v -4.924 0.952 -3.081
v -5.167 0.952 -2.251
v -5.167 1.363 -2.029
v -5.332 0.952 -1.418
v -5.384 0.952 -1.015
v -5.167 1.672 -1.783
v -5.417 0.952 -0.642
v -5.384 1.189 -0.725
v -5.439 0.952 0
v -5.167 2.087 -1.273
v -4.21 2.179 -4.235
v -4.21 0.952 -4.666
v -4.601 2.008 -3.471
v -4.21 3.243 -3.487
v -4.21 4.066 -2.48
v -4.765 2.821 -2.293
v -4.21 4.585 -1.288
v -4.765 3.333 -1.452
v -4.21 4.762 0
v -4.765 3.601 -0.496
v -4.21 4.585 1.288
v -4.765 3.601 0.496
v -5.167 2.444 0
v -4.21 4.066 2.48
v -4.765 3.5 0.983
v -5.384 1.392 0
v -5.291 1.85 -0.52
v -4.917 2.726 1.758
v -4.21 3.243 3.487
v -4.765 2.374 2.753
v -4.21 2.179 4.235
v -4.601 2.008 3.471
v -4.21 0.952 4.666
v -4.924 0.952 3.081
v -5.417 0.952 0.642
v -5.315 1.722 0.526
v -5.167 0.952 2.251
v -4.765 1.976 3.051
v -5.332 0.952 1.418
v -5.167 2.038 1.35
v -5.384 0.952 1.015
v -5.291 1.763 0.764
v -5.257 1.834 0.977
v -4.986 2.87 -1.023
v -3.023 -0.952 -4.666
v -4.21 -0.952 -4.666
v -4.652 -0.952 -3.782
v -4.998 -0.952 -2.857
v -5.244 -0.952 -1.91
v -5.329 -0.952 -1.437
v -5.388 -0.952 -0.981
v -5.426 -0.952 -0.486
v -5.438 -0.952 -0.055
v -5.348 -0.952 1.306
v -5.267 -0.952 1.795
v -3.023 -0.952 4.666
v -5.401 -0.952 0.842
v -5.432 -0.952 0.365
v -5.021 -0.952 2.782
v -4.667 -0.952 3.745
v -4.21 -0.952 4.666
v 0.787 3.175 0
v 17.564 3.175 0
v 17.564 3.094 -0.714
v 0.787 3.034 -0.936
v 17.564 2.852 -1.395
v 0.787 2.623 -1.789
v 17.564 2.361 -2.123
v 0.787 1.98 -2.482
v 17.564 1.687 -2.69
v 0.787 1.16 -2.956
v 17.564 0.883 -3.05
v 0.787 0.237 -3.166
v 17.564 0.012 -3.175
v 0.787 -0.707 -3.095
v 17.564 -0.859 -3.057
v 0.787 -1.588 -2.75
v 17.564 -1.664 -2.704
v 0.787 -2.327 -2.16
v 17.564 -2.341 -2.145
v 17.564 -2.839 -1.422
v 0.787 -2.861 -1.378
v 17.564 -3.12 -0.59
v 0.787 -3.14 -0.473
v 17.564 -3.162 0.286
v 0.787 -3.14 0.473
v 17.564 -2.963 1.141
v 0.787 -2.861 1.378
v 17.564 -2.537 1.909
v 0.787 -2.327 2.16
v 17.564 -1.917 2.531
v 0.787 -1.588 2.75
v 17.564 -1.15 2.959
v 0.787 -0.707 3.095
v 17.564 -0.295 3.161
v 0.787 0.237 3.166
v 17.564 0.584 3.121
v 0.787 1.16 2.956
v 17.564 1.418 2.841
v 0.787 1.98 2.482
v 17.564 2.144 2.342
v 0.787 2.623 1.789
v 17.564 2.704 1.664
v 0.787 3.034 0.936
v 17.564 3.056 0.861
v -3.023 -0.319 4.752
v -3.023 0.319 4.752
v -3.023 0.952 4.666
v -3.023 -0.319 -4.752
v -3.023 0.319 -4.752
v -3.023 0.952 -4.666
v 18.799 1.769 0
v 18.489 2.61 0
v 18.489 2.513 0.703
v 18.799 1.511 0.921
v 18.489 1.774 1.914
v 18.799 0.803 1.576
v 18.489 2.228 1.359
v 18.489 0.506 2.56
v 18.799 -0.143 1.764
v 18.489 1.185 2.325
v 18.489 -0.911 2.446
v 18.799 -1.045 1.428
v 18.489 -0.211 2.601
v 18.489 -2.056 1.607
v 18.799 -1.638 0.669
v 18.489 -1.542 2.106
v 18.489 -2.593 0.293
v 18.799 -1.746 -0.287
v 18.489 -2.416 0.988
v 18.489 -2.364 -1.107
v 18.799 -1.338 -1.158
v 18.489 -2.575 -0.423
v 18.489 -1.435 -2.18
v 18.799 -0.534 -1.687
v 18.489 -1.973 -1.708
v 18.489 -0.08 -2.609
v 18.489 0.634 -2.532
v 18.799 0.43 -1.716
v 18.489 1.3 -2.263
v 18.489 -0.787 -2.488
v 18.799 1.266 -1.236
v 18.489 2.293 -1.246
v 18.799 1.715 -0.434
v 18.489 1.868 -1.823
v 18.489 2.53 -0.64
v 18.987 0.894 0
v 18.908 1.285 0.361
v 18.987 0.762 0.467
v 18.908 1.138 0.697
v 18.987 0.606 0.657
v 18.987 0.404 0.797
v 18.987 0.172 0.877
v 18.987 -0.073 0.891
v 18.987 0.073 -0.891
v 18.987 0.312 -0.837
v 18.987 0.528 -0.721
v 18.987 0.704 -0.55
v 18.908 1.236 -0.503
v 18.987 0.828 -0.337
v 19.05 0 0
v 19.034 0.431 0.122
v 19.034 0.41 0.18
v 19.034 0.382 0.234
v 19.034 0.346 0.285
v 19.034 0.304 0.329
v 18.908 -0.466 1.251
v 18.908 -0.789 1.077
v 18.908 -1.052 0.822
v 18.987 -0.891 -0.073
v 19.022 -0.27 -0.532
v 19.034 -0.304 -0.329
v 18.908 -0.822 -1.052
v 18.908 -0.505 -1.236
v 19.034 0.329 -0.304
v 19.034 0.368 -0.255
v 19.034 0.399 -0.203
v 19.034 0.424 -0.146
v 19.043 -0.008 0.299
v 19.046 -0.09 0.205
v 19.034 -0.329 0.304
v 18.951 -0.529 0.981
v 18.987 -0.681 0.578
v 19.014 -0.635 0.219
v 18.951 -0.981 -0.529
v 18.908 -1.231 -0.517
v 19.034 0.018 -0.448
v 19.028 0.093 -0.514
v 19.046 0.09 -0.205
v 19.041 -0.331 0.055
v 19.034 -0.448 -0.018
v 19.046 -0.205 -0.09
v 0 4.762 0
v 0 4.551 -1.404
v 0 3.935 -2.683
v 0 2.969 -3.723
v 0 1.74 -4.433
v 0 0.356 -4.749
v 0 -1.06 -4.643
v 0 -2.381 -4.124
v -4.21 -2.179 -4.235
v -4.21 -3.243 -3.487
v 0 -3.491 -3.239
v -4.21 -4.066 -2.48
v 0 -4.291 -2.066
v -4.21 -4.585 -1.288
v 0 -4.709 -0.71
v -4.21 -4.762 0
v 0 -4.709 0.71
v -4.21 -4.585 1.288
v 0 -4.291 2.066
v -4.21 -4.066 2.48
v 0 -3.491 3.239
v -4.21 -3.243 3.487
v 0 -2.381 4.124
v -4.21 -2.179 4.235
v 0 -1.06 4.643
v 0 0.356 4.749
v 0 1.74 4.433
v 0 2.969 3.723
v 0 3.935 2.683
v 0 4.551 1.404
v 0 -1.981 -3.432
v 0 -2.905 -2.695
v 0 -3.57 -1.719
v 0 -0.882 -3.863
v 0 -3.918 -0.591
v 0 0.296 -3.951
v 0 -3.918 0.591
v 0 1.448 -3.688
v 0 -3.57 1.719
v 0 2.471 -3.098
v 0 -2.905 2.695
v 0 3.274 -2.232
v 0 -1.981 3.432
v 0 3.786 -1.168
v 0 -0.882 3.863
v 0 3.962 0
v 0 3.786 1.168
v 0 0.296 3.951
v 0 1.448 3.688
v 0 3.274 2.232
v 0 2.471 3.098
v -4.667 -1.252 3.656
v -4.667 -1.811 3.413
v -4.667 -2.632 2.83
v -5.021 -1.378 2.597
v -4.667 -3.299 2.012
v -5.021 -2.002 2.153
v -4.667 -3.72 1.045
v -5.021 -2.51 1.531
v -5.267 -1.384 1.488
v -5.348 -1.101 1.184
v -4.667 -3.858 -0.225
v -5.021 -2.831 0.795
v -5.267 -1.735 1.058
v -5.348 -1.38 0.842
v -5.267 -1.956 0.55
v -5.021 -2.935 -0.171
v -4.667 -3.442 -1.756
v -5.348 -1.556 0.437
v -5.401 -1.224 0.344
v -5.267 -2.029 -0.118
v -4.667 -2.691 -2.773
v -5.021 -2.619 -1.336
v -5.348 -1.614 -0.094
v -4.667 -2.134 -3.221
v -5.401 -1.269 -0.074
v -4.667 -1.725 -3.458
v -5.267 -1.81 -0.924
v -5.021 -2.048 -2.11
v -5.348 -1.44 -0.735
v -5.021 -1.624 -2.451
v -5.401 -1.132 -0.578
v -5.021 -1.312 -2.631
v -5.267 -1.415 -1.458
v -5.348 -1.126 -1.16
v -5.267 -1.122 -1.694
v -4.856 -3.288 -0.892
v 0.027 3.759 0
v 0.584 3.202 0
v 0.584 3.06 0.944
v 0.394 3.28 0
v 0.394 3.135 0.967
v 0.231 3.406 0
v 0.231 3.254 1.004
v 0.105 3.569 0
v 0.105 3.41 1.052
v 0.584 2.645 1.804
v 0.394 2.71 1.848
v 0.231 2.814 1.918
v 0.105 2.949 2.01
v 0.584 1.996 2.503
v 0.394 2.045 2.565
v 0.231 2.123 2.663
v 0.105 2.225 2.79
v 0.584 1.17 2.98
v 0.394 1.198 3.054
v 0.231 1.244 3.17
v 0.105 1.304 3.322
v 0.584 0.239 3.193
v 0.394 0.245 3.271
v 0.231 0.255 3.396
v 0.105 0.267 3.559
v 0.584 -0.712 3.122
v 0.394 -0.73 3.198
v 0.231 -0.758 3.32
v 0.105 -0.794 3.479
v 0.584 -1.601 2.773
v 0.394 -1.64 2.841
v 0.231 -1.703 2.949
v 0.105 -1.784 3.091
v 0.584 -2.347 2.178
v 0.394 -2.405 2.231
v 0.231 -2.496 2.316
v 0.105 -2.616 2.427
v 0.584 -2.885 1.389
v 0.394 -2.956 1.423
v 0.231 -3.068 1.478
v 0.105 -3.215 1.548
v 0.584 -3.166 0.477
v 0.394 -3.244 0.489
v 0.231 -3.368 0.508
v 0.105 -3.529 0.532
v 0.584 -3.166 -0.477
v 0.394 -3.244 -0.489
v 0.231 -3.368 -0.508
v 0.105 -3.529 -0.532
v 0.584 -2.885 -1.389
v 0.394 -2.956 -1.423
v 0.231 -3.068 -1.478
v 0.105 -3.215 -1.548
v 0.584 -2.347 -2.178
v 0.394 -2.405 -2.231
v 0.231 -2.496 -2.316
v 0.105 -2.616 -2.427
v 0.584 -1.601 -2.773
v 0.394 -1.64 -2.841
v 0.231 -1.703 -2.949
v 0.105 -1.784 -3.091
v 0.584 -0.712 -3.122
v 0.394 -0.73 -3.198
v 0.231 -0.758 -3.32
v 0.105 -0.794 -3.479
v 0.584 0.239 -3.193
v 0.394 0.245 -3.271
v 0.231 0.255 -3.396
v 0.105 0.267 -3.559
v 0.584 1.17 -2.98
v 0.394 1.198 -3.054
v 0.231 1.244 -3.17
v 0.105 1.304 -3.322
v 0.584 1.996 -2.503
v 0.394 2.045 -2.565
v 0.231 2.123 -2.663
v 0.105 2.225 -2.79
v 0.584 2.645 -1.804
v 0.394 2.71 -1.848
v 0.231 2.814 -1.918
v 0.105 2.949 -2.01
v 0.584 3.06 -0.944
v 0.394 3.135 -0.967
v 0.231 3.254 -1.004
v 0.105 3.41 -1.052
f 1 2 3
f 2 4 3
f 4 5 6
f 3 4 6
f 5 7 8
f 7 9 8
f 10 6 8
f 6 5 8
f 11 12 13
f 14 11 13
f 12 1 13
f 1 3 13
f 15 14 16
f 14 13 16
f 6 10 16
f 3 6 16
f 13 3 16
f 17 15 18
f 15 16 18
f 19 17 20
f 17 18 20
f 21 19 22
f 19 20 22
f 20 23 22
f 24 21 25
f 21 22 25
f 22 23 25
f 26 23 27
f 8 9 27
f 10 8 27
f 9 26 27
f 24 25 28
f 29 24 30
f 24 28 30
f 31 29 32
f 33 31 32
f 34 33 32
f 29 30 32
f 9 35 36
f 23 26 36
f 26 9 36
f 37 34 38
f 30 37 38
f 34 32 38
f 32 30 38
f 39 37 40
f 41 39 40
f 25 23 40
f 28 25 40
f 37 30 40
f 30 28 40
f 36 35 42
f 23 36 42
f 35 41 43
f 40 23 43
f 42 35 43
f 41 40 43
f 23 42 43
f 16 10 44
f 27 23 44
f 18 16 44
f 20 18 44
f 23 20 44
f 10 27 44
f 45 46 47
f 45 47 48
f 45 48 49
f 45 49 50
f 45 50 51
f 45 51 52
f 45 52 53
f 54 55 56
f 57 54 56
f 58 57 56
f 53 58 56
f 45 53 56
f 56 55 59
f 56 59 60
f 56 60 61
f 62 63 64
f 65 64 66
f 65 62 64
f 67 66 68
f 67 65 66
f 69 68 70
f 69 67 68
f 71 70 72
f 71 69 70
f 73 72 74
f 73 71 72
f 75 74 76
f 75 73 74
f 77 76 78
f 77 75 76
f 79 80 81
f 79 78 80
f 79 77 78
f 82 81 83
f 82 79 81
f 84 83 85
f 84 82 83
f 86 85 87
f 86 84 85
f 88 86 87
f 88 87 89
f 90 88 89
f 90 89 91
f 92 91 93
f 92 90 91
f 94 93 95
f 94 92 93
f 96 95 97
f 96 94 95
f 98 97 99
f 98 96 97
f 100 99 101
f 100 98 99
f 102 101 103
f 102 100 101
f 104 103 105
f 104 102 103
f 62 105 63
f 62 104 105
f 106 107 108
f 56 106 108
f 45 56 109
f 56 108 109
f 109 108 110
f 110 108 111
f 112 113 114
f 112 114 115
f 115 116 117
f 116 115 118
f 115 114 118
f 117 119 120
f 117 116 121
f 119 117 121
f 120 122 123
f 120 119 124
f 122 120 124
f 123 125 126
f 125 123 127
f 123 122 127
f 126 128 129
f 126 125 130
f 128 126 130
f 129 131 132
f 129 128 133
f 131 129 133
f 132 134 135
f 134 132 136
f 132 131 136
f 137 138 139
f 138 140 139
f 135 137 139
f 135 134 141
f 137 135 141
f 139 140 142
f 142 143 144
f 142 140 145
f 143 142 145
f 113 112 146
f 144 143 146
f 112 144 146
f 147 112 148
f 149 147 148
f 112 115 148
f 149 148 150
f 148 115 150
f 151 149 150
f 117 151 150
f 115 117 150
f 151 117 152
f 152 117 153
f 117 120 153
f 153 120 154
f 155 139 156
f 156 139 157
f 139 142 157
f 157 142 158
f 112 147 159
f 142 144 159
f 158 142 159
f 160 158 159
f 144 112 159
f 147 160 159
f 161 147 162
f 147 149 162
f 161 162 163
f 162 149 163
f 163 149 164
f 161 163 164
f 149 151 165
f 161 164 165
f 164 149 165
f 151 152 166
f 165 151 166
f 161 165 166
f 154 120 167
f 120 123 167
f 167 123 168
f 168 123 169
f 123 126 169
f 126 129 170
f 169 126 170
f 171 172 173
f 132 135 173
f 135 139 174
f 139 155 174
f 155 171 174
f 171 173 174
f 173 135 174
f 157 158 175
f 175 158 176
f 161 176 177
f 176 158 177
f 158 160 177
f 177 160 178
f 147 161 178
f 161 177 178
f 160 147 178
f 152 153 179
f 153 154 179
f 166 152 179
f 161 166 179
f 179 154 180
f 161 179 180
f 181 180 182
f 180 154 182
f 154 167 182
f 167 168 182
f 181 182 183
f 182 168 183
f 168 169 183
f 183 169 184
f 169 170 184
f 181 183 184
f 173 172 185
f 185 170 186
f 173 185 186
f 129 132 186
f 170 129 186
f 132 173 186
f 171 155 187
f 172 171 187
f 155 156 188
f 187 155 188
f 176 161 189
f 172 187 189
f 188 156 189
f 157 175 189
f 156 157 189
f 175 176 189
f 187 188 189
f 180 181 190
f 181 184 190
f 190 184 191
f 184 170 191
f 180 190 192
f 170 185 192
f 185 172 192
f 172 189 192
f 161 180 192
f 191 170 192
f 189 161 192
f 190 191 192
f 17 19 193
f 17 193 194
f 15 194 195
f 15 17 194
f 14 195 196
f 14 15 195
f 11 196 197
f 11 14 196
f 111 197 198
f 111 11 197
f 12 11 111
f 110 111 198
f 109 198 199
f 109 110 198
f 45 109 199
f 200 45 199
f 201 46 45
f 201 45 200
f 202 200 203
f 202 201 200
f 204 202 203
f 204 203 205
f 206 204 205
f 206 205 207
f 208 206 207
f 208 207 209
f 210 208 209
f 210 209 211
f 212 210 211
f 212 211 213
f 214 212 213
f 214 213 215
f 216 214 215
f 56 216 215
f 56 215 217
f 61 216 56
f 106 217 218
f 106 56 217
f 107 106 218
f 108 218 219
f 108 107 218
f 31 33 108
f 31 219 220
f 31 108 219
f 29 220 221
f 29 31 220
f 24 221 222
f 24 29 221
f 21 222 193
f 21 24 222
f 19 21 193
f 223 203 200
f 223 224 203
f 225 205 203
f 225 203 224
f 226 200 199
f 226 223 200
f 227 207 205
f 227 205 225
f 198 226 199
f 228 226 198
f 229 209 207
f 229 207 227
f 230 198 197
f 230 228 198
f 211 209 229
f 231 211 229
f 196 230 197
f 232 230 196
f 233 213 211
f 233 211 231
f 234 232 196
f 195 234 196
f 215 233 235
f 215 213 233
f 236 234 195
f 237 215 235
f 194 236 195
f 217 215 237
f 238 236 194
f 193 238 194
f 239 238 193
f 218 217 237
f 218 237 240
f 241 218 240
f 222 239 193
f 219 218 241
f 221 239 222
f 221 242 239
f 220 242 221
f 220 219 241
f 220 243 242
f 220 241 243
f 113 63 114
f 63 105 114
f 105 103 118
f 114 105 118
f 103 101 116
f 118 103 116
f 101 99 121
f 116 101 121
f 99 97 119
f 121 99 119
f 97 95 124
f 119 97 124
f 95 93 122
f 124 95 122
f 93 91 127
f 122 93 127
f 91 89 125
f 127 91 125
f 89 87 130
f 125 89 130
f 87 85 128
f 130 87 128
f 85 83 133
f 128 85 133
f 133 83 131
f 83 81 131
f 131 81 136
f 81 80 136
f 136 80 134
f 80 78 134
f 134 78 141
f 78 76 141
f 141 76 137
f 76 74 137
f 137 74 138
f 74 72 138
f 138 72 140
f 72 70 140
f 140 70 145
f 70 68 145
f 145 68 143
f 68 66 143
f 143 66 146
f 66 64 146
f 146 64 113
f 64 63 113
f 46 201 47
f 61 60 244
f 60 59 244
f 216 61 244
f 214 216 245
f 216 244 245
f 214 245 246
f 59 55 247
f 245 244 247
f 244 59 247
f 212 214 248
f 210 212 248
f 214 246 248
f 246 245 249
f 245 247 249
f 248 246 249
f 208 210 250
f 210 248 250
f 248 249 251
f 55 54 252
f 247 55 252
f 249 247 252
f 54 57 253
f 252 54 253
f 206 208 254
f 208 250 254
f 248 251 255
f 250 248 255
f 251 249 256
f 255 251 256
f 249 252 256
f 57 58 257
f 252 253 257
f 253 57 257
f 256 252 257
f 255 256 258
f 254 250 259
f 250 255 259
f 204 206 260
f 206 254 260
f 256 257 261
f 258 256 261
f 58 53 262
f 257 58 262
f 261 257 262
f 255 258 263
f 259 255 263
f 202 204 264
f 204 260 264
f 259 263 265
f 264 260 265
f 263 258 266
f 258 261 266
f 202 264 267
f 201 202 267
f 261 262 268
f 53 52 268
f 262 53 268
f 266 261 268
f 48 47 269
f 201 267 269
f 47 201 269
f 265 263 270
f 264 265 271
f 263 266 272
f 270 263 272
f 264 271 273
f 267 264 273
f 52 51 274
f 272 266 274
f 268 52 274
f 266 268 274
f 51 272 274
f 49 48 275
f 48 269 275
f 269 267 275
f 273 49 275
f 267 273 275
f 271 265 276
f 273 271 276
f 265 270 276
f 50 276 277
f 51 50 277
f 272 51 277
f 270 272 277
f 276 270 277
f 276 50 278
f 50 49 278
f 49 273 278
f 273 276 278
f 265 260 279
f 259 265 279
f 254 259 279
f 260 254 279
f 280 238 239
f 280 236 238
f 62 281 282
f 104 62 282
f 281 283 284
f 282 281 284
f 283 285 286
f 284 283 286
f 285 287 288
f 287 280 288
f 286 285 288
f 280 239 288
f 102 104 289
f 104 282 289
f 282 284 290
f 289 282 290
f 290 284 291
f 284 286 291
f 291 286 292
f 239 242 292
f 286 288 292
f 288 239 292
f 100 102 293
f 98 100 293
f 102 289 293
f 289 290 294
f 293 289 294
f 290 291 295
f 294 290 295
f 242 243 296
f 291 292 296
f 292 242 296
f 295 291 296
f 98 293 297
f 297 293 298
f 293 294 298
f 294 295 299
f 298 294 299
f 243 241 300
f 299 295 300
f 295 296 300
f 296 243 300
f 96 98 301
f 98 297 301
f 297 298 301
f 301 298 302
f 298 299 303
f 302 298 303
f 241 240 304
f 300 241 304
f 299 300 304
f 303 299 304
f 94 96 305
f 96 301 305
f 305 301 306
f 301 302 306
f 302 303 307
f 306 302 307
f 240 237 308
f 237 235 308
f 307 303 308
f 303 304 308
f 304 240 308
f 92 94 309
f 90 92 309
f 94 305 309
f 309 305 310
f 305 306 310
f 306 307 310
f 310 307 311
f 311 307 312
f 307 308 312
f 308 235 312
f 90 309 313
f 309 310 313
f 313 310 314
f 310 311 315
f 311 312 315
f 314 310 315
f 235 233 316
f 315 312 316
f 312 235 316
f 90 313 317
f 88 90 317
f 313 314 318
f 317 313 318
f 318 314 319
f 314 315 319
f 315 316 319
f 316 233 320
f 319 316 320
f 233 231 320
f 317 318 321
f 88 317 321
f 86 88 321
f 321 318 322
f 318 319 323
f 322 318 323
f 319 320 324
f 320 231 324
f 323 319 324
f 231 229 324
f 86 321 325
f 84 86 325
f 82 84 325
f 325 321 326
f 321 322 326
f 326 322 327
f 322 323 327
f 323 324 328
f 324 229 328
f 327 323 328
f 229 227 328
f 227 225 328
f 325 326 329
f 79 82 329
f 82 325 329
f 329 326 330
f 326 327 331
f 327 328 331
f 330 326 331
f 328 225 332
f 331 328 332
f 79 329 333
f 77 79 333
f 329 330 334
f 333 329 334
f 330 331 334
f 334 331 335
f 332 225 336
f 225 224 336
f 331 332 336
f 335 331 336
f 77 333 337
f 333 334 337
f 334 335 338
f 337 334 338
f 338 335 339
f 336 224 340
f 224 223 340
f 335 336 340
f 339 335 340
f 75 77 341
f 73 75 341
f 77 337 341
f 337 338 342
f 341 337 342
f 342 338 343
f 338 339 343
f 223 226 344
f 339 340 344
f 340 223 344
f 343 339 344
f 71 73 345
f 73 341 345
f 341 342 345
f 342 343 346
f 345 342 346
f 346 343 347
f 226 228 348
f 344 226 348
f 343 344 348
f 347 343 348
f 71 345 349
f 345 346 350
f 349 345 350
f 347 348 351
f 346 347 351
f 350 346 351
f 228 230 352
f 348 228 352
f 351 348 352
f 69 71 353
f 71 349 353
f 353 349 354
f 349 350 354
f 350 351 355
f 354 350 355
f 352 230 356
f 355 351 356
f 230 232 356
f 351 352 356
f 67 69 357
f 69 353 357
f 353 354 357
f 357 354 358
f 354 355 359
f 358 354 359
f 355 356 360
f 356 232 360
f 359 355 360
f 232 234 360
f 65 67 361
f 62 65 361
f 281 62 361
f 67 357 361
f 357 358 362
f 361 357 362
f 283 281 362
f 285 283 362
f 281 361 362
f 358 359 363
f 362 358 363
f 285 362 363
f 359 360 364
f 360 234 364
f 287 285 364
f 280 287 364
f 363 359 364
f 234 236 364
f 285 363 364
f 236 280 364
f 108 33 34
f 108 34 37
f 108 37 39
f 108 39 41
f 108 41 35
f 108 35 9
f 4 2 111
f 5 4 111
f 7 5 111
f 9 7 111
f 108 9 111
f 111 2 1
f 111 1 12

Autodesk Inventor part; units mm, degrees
ref_plane "YZ Plane" through (0, 0, 0) normal (1, 0, 0) x (0, 1, 0)
sketch "Sketch1" plane through (0, 0, 0) normal (0, 0, 1) x (1, 0, 0)
  line L0 (-5.4864, 0) -> (19.05, 0)
  line L1 (19.05, 0) -> (19.05, 3.175)
  line L2 (19.05, 3.175) -> (3.175, 3.175)
  line L3 (3.175, 3.175) -> (2.413, 3.175)
  line L4 (2.413, 3.175) -> (0, 3.175)
  line L5 (0, 3.175) -> (0, 4.7625)
  line L6 (-10.7699, 0) -> (24.02, 0) projected
  line L7 (0, -0.9693) -> (0, 5.8158) projected
  line L8 (0, 4.7625) -> (-4.2103, 4.7625)
  arc A0 (-4.2103, 4.7625) -> (-5.4864, 0) centre (4.0386, 0) ccw
  line L9 (3.175, 3.175) -> (0, 3.175) construction
  dimension "d0" = 19.05
  dimension "d1" = 15.875
  dimension "d2" = 0.762
  dimension "d3" = 5.4864
  dimension "d4" = 6.35
  dimension "d5" = 6.35
  dimension "d9" = 9.525
  dimension "d10" = 0
  dimension "d13" = 9.525
revolve "Body" add sketch "Sketch1" angle 360 about axis through (-5.4864, 0, 0) along (1, 0, 0)
ref_plane "IDS_WORKPLANE{1}" through (-5.4864, 0, 0) normal (1, 0, 0) x (0, 0, -1)
sketch "Sketch2" plane through (-5.4864, 0, 0) normal (1, 0, 0) x (0, 0, -1)
  circle A0 centre (0, 0) radius 4.7625 projected
  line L0 (0, -6.6675) -> (0, 6.6675) projected
  line L1 (6.6675, 0) -> (-6.6675, 0) projected
  line L2 (-4.7625, 0.9525) -> (4.7625, 0.9525)
  line L3 (4.7625, 0.9525) -> (4.7625, -0.9525)
  line L4 (4.7625, -0.9525) -> (-4.7625, -0.9525)
  line L5 (-4.7625, -0.9525) -> (-4.7625, 0.9525)
  line L6 (-4.7625, 0) -> (4.7625, 0) construction
  line L7 (0, 0.9525) -> (0, -0.9525) construction
  dimension "d15" = 1.905
extrude "Slot" cut sketch "Sketch2" along normal blind 2.4638 contours L1 L0 L2 A0 | L3 L4 A0 | A0 L4 L0 L1 | A0 L2 L3 | L1 A0 L2 L0 | L0 L4 A0 L1 | L5 L2 A0 | A0 L4 L5
thread "Thread" size "1/4-20 UNC" class "2A" standard "ANSI Unified Screw Threads" length 15.875
sketch "Sketch3" plane through (0, 0, 0) normal (0, 0, 1) x (1, 0, 0)
  line L0 (19.05, 0) -> (19.05, 3.175) projected
  line L1 (19.05, 3.175) -> (3.175, 3.175) projected
  line L2 (-5.4864, 0) -> (19.05, 0) projected
  arc A0 (19.05, 0) -> (18.1993, 3.175) centre (12.7, 0) ccw
  line L3 (19.05, -3.175) -> (19.05, 3.175) projected
  line L4 (18.1993, 3.175) -> (18.1993, 0)
  line L5 (18.1993, 0) -> (19.05, 0)
  dimension "d40" = 6.35
revolve "Fillet1" cut sketch "Sketch3" angle 360 about axis through (-5.4864, 0, 0) along (1, 0, 0) contours A0 L1 L0
chamfer "Chamfer" distance 0.635 angle 45 1 edges at (18.1993, -3.175, 0)
ref_plane "Work Plane2" through (41.275, 0, 0) normal (0, 0, -1) x (1, 0, 0)
fillet "Fillet4" radius 0.7874 1 edges at (0, -3.175, 0)
equation "\"d0\" = NLG"
equation "\"d1\" = GEL"
equation "\"d2\" = GAL"
equation "\"d3\" = KOH"
equation "\"d4\" = GD"
equation "\"d5\" = BDM"
equation "\"d9\" = KOD"
equation "\"d13\" = KR"
equation "\"d15\" = SBR"
equation "\"d16\" = STI"
equation "\"d40\" = GD"
equation "\"d46\" = R"
equation "\"d11\" = GEL"
equation "\"d43\" = 0.5 * RR"
equation "\"GD\" = NND"
equation "\"NLG\" = 19.05"
equation "\"GEL\" = 15.875"
equation "\"KOD\" = 9.525"
equation "\"KOH\" = 5.4864"
equation "\"GAL\" = 0.762"
equation "\"BDM\" = NND"
equation "\"SBR\" = 1.905"
equation "\"STI\" = 2.4638"
equation "\"KEWI\" = 0"
equation "\"KR\" = KOD"
equation "\"d14\" = -KOH"
equation "\"R\" = 0.7874"
equation "\"THREADDIA\" = 6.35"
equation "\"TOA\" = 30deg"
equation "\"KOH1\" = 4.3688"
equation "\"NND\" = 6.35"
equation "\"GD1\" = 4.8387"
equation "\"THREADDESC\" = 1.2345"
equation "\"RR\" = 1.27"
properties part number "ANSI B18.6.2 - 1/4-20 UNC - 0.75, SFHCSI" material "Steel, Mild"
